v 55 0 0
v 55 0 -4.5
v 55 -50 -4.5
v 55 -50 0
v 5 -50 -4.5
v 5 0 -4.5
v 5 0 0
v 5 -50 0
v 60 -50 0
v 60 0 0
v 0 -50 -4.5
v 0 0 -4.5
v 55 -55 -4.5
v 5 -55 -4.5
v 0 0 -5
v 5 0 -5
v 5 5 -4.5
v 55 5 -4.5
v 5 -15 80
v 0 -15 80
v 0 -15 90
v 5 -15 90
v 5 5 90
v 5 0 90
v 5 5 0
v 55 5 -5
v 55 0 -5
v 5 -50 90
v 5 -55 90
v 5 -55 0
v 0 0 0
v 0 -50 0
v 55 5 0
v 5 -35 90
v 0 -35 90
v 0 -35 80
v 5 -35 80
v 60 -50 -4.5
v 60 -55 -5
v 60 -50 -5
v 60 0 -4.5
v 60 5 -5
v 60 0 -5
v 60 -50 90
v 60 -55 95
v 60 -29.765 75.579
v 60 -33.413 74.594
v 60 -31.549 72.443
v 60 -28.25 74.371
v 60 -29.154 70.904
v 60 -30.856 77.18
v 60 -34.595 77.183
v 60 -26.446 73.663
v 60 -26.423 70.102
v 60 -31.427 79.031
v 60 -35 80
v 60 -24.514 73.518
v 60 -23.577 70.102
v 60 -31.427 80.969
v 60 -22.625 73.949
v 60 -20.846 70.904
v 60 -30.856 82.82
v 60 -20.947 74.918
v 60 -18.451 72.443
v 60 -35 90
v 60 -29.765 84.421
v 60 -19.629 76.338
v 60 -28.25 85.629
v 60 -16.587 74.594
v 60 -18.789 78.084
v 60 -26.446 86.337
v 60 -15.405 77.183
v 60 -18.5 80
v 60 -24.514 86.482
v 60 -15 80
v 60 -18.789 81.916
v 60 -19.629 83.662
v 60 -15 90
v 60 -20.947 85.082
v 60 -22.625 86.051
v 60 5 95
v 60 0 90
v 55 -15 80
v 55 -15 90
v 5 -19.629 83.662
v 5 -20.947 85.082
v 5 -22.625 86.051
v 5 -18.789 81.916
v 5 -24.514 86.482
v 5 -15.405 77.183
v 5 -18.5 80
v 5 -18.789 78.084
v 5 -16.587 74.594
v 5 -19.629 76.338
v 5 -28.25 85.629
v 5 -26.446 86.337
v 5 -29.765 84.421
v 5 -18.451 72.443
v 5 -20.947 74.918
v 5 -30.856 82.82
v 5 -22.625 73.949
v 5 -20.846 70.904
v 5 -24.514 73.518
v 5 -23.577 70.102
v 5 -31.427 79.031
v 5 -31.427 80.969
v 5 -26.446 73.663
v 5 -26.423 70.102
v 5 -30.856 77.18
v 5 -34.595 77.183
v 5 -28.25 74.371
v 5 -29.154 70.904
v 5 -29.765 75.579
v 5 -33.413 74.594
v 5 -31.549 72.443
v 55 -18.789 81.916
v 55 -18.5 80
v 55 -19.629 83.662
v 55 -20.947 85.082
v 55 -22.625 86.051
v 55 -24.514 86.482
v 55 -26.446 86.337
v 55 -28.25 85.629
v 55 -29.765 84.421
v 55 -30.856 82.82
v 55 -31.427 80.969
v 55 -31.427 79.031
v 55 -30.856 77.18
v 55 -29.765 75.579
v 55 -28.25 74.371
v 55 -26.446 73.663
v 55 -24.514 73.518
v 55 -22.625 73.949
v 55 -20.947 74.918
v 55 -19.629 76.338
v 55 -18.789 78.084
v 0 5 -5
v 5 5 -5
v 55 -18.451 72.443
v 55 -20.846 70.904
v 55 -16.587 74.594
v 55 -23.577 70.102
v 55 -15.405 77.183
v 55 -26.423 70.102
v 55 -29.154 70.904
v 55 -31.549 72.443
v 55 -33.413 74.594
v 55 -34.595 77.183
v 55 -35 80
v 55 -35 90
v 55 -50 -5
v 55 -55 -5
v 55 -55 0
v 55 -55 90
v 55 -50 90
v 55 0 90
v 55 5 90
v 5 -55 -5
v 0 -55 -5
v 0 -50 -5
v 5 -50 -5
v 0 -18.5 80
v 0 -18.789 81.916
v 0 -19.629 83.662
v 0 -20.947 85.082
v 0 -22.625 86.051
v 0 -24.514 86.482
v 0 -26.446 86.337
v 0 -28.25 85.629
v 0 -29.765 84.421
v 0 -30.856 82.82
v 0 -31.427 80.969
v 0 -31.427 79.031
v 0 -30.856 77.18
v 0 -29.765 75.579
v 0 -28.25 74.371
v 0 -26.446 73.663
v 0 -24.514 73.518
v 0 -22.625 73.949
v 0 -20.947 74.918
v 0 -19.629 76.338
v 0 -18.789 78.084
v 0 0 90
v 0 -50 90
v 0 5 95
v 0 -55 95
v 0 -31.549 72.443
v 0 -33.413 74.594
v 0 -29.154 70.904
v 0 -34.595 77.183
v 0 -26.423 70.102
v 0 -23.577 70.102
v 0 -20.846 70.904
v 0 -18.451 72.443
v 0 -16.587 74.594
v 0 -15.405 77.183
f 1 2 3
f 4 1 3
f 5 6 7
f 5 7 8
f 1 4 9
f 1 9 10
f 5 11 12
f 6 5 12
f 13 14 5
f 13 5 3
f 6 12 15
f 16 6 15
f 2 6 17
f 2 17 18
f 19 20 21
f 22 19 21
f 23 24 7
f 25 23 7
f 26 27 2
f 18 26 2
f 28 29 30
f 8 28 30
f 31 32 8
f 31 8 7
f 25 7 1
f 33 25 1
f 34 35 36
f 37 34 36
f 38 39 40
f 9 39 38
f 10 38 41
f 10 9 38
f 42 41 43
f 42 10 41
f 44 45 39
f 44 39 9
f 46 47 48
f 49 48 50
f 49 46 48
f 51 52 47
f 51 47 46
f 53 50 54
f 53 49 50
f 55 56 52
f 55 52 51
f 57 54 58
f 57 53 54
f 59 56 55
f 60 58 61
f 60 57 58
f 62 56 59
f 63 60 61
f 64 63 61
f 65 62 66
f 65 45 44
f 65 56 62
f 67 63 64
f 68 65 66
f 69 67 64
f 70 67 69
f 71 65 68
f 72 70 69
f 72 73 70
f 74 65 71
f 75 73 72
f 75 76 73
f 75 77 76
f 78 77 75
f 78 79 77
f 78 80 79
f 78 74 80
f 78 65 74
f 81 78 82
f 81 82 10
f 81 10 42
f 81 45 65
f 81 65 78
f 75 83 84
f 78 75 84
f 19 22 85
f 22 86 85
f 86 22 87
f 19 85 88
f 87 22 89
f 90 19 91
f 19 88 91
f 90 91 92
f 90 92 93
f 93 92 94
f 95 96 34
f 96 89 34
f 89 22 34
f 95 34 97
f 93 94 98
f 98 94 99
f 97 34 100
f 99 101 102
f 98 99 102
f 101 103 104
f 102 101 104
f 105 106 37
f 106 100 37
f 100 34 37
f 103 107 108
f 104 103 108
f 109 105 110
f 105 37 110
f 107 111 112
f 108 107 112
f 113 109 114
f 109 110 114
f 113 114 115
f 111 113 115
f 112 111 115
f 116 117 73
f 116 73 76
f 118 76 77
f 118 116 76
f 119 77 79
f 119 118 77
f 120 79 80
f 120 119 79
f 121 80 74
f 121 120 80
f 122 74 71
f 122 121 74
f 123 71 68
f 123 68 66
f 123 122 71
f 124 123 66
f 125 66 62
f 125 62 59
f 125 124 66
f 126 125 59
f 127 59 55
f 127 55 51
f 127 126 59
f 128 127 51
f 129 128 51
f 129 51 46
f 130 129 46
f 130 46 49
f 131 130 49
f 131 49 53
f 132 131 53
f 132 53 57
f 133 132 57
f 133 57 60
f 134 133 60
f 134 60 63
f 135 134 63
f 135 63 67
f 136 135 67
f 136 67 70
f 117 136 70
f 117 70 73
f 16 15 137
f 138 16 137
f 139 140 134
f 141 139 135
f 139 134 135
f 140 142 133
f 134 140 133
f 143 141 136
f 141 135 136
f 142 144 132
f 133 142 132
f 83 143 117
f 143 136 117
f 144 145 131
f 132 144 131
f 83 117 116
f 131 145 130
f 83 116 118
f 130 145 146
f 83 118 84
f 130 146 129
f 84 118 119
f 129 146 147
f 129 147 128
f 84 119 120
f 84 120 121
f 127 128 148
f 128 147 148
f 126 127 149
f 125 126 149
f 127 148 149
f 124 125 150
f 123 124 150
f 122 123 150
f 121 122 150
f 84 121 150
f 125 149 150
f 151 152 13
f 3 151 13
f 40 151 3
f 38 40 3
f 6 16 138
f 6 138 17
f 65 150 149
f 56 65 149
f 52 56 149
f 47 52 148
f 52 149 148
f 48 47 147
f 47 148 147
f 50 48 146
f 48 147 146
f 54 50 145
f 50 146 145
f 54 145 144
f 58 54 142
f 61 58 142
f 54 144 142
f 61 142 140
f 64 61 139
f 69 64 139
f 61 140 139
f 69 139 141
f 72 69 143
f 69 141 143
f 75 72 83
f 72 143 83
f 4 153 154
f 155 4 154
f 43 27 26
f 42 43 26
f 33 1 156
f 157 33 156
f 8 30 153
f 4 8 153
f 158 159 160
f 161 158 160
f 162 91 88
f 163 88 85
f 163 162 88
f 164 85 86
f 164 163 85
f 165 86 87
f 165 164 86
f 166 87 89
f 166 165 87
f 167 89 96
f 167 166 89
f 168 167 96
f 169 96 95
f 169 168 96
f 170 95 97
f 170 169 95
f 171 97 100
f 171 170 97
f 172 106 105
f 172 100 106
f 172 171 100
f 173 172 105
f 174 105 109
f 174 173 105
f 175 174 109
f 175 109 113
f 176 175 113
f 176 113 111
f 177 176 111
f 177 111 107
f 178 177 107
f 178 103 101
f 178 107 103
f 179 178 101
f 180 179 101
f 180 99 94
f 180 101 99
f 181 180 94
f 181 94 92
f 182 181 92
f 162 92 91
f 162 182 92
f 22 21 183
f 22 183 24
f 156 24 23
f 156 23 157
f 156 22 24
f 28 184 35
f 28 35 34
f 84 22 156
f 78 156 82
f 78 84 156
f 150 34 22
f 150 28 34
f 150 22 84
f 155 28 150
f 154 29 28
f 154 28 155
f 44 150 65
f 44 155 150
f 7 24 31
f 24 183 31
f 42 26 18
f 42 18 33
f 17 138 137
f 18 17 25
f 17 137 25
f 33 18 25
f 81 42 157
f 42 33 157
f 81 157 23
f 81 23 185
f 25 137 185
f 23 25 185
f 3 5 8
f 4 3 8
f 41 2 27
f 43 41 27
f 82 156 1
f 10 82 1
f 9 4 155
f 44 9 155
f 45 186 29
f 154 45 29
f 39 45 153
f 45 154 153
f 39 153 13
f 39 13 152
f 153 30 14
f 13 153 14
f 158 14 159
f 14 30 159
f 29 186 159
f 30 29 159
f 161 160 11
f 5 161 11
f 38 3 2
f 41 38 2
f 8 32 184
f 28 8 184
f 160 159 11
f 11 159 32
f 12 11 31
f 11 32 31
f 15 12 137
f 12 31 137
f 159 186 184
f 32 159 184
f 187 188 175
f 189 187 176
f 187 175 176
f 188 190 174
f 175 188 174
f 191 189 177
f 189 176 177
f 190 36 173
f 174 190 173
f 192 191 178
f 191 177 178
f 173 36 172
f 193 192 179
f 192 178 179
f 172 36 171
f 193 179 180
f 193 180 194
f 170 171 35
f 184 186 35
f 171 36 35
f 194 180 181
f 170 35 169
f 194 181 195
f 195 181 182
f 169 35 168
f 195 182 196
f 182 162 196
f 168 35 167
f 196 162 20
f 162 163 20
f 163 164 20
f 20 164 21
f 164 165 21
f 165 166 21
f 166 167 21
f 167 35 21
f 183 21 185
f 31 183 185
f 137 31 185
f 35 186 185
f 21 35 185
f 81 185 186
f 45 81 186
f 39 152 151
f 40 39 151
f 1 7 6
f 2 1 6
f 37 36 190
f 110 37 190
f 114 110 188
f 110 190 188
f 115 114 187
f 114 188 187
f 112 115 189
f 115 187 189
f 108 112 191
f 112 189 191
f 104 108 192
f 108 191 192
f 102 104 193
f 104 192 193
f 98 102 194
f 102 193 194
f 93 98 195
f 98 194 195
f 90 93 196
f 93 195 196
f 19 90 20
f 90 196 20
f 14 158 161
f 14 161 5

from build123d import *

# Parameters (mm, degrees)
F0_W     = 50
F0_H     = 4.5
F0_R     = 6.5
F1_DEPTH = 60
F4_W     = 50
F4_H     = 50
F5_DEPTH = 4.5
F6_W     = 50
F6_H     = 65
F6_H_2   = 25
F6_H_3   = 0.5
F7_DEPTH = 60


with BuildPart() as f1:
    # F0 (on Right) → F1 (new body)
    with BuildSketch(Plane.YZ):
        Polygon((-55, 95), (-55, 90), (-50, 90), (-35, 90), (-25, 90), (-15, 90), (0, 90), (5, 90), (5, 95), align=None)
        Polygon((-50, 90), (-55, 90), (-55, -5), (-50, -5), (-50, -4.5), (-50, 0), align=None)
        with Locations((-25, -2.25)):
            Rectangle(F0_W, F0_H)
        Polygon((0, 90), (0, 0), (0, -4.5), (0, -5), (5, -5), (5, 90), align=None)
        with BuildLine():
            ThreePointArc((-15, 80), (-17.9289321881, 87.0710678119), (-25, 90))
            ThreePointArc((-25, 90), (-32.0710678119, 87.0710678119), (-35, 80))
            ThreePointArc((-35, 80), (-25, 70), (-15, 80))
        make_face()
        with Locations((-25, 80)):
            Circle(F0_R, mode=Mode.SUBTRACT)
        with BuildLine():
            Line((-25, 90), (-35, 90))
            Line((-35, 90), (-35, 80))
            ThreePointArc((-35, 80), (-32.0710678119, 87.0710678119), (-25, 90))
        make_face()
        with BuildLine():
            Line((-15, 90), (-25, 90))
            ThreePointArc((-25, 90), (-17.9289321881, 87.0710678119), (-15, 80))
            Line((-15, 80), (-15, 90))
        make_face()
    extrude(amount=F1_DEPTH)

    # F4 (on face) → F5 (cut)
    with BuildSketch(Plane(origin=(0, 0, -4.5), x_dir=(1, 0, 0), z_dir=(0, 0, -1))):
        with Locations((30, 25)):
            Rectangle(F4_W, F4_H)
    extrude(amount=-F5_DEPTH, mode=Mode.SUBTRACT)

    # F6 (on offset) → F7 (cut)
    with BuildSketch(Plane.XZ.offset(55)):
        with Locations((30, 57.5)):
            Rectangle(F6_W, F6_H)
        with Locations((30, 12.5)):
            Rectangle(F6_W, F6_H_2)
        with Locations((30, -4.75)):
            Rectangle(F6_W, F6_H_3)
    extrude(amount=-F7_DEPTH, mode=Mode.SUBTRACT)


solid = f1.part
